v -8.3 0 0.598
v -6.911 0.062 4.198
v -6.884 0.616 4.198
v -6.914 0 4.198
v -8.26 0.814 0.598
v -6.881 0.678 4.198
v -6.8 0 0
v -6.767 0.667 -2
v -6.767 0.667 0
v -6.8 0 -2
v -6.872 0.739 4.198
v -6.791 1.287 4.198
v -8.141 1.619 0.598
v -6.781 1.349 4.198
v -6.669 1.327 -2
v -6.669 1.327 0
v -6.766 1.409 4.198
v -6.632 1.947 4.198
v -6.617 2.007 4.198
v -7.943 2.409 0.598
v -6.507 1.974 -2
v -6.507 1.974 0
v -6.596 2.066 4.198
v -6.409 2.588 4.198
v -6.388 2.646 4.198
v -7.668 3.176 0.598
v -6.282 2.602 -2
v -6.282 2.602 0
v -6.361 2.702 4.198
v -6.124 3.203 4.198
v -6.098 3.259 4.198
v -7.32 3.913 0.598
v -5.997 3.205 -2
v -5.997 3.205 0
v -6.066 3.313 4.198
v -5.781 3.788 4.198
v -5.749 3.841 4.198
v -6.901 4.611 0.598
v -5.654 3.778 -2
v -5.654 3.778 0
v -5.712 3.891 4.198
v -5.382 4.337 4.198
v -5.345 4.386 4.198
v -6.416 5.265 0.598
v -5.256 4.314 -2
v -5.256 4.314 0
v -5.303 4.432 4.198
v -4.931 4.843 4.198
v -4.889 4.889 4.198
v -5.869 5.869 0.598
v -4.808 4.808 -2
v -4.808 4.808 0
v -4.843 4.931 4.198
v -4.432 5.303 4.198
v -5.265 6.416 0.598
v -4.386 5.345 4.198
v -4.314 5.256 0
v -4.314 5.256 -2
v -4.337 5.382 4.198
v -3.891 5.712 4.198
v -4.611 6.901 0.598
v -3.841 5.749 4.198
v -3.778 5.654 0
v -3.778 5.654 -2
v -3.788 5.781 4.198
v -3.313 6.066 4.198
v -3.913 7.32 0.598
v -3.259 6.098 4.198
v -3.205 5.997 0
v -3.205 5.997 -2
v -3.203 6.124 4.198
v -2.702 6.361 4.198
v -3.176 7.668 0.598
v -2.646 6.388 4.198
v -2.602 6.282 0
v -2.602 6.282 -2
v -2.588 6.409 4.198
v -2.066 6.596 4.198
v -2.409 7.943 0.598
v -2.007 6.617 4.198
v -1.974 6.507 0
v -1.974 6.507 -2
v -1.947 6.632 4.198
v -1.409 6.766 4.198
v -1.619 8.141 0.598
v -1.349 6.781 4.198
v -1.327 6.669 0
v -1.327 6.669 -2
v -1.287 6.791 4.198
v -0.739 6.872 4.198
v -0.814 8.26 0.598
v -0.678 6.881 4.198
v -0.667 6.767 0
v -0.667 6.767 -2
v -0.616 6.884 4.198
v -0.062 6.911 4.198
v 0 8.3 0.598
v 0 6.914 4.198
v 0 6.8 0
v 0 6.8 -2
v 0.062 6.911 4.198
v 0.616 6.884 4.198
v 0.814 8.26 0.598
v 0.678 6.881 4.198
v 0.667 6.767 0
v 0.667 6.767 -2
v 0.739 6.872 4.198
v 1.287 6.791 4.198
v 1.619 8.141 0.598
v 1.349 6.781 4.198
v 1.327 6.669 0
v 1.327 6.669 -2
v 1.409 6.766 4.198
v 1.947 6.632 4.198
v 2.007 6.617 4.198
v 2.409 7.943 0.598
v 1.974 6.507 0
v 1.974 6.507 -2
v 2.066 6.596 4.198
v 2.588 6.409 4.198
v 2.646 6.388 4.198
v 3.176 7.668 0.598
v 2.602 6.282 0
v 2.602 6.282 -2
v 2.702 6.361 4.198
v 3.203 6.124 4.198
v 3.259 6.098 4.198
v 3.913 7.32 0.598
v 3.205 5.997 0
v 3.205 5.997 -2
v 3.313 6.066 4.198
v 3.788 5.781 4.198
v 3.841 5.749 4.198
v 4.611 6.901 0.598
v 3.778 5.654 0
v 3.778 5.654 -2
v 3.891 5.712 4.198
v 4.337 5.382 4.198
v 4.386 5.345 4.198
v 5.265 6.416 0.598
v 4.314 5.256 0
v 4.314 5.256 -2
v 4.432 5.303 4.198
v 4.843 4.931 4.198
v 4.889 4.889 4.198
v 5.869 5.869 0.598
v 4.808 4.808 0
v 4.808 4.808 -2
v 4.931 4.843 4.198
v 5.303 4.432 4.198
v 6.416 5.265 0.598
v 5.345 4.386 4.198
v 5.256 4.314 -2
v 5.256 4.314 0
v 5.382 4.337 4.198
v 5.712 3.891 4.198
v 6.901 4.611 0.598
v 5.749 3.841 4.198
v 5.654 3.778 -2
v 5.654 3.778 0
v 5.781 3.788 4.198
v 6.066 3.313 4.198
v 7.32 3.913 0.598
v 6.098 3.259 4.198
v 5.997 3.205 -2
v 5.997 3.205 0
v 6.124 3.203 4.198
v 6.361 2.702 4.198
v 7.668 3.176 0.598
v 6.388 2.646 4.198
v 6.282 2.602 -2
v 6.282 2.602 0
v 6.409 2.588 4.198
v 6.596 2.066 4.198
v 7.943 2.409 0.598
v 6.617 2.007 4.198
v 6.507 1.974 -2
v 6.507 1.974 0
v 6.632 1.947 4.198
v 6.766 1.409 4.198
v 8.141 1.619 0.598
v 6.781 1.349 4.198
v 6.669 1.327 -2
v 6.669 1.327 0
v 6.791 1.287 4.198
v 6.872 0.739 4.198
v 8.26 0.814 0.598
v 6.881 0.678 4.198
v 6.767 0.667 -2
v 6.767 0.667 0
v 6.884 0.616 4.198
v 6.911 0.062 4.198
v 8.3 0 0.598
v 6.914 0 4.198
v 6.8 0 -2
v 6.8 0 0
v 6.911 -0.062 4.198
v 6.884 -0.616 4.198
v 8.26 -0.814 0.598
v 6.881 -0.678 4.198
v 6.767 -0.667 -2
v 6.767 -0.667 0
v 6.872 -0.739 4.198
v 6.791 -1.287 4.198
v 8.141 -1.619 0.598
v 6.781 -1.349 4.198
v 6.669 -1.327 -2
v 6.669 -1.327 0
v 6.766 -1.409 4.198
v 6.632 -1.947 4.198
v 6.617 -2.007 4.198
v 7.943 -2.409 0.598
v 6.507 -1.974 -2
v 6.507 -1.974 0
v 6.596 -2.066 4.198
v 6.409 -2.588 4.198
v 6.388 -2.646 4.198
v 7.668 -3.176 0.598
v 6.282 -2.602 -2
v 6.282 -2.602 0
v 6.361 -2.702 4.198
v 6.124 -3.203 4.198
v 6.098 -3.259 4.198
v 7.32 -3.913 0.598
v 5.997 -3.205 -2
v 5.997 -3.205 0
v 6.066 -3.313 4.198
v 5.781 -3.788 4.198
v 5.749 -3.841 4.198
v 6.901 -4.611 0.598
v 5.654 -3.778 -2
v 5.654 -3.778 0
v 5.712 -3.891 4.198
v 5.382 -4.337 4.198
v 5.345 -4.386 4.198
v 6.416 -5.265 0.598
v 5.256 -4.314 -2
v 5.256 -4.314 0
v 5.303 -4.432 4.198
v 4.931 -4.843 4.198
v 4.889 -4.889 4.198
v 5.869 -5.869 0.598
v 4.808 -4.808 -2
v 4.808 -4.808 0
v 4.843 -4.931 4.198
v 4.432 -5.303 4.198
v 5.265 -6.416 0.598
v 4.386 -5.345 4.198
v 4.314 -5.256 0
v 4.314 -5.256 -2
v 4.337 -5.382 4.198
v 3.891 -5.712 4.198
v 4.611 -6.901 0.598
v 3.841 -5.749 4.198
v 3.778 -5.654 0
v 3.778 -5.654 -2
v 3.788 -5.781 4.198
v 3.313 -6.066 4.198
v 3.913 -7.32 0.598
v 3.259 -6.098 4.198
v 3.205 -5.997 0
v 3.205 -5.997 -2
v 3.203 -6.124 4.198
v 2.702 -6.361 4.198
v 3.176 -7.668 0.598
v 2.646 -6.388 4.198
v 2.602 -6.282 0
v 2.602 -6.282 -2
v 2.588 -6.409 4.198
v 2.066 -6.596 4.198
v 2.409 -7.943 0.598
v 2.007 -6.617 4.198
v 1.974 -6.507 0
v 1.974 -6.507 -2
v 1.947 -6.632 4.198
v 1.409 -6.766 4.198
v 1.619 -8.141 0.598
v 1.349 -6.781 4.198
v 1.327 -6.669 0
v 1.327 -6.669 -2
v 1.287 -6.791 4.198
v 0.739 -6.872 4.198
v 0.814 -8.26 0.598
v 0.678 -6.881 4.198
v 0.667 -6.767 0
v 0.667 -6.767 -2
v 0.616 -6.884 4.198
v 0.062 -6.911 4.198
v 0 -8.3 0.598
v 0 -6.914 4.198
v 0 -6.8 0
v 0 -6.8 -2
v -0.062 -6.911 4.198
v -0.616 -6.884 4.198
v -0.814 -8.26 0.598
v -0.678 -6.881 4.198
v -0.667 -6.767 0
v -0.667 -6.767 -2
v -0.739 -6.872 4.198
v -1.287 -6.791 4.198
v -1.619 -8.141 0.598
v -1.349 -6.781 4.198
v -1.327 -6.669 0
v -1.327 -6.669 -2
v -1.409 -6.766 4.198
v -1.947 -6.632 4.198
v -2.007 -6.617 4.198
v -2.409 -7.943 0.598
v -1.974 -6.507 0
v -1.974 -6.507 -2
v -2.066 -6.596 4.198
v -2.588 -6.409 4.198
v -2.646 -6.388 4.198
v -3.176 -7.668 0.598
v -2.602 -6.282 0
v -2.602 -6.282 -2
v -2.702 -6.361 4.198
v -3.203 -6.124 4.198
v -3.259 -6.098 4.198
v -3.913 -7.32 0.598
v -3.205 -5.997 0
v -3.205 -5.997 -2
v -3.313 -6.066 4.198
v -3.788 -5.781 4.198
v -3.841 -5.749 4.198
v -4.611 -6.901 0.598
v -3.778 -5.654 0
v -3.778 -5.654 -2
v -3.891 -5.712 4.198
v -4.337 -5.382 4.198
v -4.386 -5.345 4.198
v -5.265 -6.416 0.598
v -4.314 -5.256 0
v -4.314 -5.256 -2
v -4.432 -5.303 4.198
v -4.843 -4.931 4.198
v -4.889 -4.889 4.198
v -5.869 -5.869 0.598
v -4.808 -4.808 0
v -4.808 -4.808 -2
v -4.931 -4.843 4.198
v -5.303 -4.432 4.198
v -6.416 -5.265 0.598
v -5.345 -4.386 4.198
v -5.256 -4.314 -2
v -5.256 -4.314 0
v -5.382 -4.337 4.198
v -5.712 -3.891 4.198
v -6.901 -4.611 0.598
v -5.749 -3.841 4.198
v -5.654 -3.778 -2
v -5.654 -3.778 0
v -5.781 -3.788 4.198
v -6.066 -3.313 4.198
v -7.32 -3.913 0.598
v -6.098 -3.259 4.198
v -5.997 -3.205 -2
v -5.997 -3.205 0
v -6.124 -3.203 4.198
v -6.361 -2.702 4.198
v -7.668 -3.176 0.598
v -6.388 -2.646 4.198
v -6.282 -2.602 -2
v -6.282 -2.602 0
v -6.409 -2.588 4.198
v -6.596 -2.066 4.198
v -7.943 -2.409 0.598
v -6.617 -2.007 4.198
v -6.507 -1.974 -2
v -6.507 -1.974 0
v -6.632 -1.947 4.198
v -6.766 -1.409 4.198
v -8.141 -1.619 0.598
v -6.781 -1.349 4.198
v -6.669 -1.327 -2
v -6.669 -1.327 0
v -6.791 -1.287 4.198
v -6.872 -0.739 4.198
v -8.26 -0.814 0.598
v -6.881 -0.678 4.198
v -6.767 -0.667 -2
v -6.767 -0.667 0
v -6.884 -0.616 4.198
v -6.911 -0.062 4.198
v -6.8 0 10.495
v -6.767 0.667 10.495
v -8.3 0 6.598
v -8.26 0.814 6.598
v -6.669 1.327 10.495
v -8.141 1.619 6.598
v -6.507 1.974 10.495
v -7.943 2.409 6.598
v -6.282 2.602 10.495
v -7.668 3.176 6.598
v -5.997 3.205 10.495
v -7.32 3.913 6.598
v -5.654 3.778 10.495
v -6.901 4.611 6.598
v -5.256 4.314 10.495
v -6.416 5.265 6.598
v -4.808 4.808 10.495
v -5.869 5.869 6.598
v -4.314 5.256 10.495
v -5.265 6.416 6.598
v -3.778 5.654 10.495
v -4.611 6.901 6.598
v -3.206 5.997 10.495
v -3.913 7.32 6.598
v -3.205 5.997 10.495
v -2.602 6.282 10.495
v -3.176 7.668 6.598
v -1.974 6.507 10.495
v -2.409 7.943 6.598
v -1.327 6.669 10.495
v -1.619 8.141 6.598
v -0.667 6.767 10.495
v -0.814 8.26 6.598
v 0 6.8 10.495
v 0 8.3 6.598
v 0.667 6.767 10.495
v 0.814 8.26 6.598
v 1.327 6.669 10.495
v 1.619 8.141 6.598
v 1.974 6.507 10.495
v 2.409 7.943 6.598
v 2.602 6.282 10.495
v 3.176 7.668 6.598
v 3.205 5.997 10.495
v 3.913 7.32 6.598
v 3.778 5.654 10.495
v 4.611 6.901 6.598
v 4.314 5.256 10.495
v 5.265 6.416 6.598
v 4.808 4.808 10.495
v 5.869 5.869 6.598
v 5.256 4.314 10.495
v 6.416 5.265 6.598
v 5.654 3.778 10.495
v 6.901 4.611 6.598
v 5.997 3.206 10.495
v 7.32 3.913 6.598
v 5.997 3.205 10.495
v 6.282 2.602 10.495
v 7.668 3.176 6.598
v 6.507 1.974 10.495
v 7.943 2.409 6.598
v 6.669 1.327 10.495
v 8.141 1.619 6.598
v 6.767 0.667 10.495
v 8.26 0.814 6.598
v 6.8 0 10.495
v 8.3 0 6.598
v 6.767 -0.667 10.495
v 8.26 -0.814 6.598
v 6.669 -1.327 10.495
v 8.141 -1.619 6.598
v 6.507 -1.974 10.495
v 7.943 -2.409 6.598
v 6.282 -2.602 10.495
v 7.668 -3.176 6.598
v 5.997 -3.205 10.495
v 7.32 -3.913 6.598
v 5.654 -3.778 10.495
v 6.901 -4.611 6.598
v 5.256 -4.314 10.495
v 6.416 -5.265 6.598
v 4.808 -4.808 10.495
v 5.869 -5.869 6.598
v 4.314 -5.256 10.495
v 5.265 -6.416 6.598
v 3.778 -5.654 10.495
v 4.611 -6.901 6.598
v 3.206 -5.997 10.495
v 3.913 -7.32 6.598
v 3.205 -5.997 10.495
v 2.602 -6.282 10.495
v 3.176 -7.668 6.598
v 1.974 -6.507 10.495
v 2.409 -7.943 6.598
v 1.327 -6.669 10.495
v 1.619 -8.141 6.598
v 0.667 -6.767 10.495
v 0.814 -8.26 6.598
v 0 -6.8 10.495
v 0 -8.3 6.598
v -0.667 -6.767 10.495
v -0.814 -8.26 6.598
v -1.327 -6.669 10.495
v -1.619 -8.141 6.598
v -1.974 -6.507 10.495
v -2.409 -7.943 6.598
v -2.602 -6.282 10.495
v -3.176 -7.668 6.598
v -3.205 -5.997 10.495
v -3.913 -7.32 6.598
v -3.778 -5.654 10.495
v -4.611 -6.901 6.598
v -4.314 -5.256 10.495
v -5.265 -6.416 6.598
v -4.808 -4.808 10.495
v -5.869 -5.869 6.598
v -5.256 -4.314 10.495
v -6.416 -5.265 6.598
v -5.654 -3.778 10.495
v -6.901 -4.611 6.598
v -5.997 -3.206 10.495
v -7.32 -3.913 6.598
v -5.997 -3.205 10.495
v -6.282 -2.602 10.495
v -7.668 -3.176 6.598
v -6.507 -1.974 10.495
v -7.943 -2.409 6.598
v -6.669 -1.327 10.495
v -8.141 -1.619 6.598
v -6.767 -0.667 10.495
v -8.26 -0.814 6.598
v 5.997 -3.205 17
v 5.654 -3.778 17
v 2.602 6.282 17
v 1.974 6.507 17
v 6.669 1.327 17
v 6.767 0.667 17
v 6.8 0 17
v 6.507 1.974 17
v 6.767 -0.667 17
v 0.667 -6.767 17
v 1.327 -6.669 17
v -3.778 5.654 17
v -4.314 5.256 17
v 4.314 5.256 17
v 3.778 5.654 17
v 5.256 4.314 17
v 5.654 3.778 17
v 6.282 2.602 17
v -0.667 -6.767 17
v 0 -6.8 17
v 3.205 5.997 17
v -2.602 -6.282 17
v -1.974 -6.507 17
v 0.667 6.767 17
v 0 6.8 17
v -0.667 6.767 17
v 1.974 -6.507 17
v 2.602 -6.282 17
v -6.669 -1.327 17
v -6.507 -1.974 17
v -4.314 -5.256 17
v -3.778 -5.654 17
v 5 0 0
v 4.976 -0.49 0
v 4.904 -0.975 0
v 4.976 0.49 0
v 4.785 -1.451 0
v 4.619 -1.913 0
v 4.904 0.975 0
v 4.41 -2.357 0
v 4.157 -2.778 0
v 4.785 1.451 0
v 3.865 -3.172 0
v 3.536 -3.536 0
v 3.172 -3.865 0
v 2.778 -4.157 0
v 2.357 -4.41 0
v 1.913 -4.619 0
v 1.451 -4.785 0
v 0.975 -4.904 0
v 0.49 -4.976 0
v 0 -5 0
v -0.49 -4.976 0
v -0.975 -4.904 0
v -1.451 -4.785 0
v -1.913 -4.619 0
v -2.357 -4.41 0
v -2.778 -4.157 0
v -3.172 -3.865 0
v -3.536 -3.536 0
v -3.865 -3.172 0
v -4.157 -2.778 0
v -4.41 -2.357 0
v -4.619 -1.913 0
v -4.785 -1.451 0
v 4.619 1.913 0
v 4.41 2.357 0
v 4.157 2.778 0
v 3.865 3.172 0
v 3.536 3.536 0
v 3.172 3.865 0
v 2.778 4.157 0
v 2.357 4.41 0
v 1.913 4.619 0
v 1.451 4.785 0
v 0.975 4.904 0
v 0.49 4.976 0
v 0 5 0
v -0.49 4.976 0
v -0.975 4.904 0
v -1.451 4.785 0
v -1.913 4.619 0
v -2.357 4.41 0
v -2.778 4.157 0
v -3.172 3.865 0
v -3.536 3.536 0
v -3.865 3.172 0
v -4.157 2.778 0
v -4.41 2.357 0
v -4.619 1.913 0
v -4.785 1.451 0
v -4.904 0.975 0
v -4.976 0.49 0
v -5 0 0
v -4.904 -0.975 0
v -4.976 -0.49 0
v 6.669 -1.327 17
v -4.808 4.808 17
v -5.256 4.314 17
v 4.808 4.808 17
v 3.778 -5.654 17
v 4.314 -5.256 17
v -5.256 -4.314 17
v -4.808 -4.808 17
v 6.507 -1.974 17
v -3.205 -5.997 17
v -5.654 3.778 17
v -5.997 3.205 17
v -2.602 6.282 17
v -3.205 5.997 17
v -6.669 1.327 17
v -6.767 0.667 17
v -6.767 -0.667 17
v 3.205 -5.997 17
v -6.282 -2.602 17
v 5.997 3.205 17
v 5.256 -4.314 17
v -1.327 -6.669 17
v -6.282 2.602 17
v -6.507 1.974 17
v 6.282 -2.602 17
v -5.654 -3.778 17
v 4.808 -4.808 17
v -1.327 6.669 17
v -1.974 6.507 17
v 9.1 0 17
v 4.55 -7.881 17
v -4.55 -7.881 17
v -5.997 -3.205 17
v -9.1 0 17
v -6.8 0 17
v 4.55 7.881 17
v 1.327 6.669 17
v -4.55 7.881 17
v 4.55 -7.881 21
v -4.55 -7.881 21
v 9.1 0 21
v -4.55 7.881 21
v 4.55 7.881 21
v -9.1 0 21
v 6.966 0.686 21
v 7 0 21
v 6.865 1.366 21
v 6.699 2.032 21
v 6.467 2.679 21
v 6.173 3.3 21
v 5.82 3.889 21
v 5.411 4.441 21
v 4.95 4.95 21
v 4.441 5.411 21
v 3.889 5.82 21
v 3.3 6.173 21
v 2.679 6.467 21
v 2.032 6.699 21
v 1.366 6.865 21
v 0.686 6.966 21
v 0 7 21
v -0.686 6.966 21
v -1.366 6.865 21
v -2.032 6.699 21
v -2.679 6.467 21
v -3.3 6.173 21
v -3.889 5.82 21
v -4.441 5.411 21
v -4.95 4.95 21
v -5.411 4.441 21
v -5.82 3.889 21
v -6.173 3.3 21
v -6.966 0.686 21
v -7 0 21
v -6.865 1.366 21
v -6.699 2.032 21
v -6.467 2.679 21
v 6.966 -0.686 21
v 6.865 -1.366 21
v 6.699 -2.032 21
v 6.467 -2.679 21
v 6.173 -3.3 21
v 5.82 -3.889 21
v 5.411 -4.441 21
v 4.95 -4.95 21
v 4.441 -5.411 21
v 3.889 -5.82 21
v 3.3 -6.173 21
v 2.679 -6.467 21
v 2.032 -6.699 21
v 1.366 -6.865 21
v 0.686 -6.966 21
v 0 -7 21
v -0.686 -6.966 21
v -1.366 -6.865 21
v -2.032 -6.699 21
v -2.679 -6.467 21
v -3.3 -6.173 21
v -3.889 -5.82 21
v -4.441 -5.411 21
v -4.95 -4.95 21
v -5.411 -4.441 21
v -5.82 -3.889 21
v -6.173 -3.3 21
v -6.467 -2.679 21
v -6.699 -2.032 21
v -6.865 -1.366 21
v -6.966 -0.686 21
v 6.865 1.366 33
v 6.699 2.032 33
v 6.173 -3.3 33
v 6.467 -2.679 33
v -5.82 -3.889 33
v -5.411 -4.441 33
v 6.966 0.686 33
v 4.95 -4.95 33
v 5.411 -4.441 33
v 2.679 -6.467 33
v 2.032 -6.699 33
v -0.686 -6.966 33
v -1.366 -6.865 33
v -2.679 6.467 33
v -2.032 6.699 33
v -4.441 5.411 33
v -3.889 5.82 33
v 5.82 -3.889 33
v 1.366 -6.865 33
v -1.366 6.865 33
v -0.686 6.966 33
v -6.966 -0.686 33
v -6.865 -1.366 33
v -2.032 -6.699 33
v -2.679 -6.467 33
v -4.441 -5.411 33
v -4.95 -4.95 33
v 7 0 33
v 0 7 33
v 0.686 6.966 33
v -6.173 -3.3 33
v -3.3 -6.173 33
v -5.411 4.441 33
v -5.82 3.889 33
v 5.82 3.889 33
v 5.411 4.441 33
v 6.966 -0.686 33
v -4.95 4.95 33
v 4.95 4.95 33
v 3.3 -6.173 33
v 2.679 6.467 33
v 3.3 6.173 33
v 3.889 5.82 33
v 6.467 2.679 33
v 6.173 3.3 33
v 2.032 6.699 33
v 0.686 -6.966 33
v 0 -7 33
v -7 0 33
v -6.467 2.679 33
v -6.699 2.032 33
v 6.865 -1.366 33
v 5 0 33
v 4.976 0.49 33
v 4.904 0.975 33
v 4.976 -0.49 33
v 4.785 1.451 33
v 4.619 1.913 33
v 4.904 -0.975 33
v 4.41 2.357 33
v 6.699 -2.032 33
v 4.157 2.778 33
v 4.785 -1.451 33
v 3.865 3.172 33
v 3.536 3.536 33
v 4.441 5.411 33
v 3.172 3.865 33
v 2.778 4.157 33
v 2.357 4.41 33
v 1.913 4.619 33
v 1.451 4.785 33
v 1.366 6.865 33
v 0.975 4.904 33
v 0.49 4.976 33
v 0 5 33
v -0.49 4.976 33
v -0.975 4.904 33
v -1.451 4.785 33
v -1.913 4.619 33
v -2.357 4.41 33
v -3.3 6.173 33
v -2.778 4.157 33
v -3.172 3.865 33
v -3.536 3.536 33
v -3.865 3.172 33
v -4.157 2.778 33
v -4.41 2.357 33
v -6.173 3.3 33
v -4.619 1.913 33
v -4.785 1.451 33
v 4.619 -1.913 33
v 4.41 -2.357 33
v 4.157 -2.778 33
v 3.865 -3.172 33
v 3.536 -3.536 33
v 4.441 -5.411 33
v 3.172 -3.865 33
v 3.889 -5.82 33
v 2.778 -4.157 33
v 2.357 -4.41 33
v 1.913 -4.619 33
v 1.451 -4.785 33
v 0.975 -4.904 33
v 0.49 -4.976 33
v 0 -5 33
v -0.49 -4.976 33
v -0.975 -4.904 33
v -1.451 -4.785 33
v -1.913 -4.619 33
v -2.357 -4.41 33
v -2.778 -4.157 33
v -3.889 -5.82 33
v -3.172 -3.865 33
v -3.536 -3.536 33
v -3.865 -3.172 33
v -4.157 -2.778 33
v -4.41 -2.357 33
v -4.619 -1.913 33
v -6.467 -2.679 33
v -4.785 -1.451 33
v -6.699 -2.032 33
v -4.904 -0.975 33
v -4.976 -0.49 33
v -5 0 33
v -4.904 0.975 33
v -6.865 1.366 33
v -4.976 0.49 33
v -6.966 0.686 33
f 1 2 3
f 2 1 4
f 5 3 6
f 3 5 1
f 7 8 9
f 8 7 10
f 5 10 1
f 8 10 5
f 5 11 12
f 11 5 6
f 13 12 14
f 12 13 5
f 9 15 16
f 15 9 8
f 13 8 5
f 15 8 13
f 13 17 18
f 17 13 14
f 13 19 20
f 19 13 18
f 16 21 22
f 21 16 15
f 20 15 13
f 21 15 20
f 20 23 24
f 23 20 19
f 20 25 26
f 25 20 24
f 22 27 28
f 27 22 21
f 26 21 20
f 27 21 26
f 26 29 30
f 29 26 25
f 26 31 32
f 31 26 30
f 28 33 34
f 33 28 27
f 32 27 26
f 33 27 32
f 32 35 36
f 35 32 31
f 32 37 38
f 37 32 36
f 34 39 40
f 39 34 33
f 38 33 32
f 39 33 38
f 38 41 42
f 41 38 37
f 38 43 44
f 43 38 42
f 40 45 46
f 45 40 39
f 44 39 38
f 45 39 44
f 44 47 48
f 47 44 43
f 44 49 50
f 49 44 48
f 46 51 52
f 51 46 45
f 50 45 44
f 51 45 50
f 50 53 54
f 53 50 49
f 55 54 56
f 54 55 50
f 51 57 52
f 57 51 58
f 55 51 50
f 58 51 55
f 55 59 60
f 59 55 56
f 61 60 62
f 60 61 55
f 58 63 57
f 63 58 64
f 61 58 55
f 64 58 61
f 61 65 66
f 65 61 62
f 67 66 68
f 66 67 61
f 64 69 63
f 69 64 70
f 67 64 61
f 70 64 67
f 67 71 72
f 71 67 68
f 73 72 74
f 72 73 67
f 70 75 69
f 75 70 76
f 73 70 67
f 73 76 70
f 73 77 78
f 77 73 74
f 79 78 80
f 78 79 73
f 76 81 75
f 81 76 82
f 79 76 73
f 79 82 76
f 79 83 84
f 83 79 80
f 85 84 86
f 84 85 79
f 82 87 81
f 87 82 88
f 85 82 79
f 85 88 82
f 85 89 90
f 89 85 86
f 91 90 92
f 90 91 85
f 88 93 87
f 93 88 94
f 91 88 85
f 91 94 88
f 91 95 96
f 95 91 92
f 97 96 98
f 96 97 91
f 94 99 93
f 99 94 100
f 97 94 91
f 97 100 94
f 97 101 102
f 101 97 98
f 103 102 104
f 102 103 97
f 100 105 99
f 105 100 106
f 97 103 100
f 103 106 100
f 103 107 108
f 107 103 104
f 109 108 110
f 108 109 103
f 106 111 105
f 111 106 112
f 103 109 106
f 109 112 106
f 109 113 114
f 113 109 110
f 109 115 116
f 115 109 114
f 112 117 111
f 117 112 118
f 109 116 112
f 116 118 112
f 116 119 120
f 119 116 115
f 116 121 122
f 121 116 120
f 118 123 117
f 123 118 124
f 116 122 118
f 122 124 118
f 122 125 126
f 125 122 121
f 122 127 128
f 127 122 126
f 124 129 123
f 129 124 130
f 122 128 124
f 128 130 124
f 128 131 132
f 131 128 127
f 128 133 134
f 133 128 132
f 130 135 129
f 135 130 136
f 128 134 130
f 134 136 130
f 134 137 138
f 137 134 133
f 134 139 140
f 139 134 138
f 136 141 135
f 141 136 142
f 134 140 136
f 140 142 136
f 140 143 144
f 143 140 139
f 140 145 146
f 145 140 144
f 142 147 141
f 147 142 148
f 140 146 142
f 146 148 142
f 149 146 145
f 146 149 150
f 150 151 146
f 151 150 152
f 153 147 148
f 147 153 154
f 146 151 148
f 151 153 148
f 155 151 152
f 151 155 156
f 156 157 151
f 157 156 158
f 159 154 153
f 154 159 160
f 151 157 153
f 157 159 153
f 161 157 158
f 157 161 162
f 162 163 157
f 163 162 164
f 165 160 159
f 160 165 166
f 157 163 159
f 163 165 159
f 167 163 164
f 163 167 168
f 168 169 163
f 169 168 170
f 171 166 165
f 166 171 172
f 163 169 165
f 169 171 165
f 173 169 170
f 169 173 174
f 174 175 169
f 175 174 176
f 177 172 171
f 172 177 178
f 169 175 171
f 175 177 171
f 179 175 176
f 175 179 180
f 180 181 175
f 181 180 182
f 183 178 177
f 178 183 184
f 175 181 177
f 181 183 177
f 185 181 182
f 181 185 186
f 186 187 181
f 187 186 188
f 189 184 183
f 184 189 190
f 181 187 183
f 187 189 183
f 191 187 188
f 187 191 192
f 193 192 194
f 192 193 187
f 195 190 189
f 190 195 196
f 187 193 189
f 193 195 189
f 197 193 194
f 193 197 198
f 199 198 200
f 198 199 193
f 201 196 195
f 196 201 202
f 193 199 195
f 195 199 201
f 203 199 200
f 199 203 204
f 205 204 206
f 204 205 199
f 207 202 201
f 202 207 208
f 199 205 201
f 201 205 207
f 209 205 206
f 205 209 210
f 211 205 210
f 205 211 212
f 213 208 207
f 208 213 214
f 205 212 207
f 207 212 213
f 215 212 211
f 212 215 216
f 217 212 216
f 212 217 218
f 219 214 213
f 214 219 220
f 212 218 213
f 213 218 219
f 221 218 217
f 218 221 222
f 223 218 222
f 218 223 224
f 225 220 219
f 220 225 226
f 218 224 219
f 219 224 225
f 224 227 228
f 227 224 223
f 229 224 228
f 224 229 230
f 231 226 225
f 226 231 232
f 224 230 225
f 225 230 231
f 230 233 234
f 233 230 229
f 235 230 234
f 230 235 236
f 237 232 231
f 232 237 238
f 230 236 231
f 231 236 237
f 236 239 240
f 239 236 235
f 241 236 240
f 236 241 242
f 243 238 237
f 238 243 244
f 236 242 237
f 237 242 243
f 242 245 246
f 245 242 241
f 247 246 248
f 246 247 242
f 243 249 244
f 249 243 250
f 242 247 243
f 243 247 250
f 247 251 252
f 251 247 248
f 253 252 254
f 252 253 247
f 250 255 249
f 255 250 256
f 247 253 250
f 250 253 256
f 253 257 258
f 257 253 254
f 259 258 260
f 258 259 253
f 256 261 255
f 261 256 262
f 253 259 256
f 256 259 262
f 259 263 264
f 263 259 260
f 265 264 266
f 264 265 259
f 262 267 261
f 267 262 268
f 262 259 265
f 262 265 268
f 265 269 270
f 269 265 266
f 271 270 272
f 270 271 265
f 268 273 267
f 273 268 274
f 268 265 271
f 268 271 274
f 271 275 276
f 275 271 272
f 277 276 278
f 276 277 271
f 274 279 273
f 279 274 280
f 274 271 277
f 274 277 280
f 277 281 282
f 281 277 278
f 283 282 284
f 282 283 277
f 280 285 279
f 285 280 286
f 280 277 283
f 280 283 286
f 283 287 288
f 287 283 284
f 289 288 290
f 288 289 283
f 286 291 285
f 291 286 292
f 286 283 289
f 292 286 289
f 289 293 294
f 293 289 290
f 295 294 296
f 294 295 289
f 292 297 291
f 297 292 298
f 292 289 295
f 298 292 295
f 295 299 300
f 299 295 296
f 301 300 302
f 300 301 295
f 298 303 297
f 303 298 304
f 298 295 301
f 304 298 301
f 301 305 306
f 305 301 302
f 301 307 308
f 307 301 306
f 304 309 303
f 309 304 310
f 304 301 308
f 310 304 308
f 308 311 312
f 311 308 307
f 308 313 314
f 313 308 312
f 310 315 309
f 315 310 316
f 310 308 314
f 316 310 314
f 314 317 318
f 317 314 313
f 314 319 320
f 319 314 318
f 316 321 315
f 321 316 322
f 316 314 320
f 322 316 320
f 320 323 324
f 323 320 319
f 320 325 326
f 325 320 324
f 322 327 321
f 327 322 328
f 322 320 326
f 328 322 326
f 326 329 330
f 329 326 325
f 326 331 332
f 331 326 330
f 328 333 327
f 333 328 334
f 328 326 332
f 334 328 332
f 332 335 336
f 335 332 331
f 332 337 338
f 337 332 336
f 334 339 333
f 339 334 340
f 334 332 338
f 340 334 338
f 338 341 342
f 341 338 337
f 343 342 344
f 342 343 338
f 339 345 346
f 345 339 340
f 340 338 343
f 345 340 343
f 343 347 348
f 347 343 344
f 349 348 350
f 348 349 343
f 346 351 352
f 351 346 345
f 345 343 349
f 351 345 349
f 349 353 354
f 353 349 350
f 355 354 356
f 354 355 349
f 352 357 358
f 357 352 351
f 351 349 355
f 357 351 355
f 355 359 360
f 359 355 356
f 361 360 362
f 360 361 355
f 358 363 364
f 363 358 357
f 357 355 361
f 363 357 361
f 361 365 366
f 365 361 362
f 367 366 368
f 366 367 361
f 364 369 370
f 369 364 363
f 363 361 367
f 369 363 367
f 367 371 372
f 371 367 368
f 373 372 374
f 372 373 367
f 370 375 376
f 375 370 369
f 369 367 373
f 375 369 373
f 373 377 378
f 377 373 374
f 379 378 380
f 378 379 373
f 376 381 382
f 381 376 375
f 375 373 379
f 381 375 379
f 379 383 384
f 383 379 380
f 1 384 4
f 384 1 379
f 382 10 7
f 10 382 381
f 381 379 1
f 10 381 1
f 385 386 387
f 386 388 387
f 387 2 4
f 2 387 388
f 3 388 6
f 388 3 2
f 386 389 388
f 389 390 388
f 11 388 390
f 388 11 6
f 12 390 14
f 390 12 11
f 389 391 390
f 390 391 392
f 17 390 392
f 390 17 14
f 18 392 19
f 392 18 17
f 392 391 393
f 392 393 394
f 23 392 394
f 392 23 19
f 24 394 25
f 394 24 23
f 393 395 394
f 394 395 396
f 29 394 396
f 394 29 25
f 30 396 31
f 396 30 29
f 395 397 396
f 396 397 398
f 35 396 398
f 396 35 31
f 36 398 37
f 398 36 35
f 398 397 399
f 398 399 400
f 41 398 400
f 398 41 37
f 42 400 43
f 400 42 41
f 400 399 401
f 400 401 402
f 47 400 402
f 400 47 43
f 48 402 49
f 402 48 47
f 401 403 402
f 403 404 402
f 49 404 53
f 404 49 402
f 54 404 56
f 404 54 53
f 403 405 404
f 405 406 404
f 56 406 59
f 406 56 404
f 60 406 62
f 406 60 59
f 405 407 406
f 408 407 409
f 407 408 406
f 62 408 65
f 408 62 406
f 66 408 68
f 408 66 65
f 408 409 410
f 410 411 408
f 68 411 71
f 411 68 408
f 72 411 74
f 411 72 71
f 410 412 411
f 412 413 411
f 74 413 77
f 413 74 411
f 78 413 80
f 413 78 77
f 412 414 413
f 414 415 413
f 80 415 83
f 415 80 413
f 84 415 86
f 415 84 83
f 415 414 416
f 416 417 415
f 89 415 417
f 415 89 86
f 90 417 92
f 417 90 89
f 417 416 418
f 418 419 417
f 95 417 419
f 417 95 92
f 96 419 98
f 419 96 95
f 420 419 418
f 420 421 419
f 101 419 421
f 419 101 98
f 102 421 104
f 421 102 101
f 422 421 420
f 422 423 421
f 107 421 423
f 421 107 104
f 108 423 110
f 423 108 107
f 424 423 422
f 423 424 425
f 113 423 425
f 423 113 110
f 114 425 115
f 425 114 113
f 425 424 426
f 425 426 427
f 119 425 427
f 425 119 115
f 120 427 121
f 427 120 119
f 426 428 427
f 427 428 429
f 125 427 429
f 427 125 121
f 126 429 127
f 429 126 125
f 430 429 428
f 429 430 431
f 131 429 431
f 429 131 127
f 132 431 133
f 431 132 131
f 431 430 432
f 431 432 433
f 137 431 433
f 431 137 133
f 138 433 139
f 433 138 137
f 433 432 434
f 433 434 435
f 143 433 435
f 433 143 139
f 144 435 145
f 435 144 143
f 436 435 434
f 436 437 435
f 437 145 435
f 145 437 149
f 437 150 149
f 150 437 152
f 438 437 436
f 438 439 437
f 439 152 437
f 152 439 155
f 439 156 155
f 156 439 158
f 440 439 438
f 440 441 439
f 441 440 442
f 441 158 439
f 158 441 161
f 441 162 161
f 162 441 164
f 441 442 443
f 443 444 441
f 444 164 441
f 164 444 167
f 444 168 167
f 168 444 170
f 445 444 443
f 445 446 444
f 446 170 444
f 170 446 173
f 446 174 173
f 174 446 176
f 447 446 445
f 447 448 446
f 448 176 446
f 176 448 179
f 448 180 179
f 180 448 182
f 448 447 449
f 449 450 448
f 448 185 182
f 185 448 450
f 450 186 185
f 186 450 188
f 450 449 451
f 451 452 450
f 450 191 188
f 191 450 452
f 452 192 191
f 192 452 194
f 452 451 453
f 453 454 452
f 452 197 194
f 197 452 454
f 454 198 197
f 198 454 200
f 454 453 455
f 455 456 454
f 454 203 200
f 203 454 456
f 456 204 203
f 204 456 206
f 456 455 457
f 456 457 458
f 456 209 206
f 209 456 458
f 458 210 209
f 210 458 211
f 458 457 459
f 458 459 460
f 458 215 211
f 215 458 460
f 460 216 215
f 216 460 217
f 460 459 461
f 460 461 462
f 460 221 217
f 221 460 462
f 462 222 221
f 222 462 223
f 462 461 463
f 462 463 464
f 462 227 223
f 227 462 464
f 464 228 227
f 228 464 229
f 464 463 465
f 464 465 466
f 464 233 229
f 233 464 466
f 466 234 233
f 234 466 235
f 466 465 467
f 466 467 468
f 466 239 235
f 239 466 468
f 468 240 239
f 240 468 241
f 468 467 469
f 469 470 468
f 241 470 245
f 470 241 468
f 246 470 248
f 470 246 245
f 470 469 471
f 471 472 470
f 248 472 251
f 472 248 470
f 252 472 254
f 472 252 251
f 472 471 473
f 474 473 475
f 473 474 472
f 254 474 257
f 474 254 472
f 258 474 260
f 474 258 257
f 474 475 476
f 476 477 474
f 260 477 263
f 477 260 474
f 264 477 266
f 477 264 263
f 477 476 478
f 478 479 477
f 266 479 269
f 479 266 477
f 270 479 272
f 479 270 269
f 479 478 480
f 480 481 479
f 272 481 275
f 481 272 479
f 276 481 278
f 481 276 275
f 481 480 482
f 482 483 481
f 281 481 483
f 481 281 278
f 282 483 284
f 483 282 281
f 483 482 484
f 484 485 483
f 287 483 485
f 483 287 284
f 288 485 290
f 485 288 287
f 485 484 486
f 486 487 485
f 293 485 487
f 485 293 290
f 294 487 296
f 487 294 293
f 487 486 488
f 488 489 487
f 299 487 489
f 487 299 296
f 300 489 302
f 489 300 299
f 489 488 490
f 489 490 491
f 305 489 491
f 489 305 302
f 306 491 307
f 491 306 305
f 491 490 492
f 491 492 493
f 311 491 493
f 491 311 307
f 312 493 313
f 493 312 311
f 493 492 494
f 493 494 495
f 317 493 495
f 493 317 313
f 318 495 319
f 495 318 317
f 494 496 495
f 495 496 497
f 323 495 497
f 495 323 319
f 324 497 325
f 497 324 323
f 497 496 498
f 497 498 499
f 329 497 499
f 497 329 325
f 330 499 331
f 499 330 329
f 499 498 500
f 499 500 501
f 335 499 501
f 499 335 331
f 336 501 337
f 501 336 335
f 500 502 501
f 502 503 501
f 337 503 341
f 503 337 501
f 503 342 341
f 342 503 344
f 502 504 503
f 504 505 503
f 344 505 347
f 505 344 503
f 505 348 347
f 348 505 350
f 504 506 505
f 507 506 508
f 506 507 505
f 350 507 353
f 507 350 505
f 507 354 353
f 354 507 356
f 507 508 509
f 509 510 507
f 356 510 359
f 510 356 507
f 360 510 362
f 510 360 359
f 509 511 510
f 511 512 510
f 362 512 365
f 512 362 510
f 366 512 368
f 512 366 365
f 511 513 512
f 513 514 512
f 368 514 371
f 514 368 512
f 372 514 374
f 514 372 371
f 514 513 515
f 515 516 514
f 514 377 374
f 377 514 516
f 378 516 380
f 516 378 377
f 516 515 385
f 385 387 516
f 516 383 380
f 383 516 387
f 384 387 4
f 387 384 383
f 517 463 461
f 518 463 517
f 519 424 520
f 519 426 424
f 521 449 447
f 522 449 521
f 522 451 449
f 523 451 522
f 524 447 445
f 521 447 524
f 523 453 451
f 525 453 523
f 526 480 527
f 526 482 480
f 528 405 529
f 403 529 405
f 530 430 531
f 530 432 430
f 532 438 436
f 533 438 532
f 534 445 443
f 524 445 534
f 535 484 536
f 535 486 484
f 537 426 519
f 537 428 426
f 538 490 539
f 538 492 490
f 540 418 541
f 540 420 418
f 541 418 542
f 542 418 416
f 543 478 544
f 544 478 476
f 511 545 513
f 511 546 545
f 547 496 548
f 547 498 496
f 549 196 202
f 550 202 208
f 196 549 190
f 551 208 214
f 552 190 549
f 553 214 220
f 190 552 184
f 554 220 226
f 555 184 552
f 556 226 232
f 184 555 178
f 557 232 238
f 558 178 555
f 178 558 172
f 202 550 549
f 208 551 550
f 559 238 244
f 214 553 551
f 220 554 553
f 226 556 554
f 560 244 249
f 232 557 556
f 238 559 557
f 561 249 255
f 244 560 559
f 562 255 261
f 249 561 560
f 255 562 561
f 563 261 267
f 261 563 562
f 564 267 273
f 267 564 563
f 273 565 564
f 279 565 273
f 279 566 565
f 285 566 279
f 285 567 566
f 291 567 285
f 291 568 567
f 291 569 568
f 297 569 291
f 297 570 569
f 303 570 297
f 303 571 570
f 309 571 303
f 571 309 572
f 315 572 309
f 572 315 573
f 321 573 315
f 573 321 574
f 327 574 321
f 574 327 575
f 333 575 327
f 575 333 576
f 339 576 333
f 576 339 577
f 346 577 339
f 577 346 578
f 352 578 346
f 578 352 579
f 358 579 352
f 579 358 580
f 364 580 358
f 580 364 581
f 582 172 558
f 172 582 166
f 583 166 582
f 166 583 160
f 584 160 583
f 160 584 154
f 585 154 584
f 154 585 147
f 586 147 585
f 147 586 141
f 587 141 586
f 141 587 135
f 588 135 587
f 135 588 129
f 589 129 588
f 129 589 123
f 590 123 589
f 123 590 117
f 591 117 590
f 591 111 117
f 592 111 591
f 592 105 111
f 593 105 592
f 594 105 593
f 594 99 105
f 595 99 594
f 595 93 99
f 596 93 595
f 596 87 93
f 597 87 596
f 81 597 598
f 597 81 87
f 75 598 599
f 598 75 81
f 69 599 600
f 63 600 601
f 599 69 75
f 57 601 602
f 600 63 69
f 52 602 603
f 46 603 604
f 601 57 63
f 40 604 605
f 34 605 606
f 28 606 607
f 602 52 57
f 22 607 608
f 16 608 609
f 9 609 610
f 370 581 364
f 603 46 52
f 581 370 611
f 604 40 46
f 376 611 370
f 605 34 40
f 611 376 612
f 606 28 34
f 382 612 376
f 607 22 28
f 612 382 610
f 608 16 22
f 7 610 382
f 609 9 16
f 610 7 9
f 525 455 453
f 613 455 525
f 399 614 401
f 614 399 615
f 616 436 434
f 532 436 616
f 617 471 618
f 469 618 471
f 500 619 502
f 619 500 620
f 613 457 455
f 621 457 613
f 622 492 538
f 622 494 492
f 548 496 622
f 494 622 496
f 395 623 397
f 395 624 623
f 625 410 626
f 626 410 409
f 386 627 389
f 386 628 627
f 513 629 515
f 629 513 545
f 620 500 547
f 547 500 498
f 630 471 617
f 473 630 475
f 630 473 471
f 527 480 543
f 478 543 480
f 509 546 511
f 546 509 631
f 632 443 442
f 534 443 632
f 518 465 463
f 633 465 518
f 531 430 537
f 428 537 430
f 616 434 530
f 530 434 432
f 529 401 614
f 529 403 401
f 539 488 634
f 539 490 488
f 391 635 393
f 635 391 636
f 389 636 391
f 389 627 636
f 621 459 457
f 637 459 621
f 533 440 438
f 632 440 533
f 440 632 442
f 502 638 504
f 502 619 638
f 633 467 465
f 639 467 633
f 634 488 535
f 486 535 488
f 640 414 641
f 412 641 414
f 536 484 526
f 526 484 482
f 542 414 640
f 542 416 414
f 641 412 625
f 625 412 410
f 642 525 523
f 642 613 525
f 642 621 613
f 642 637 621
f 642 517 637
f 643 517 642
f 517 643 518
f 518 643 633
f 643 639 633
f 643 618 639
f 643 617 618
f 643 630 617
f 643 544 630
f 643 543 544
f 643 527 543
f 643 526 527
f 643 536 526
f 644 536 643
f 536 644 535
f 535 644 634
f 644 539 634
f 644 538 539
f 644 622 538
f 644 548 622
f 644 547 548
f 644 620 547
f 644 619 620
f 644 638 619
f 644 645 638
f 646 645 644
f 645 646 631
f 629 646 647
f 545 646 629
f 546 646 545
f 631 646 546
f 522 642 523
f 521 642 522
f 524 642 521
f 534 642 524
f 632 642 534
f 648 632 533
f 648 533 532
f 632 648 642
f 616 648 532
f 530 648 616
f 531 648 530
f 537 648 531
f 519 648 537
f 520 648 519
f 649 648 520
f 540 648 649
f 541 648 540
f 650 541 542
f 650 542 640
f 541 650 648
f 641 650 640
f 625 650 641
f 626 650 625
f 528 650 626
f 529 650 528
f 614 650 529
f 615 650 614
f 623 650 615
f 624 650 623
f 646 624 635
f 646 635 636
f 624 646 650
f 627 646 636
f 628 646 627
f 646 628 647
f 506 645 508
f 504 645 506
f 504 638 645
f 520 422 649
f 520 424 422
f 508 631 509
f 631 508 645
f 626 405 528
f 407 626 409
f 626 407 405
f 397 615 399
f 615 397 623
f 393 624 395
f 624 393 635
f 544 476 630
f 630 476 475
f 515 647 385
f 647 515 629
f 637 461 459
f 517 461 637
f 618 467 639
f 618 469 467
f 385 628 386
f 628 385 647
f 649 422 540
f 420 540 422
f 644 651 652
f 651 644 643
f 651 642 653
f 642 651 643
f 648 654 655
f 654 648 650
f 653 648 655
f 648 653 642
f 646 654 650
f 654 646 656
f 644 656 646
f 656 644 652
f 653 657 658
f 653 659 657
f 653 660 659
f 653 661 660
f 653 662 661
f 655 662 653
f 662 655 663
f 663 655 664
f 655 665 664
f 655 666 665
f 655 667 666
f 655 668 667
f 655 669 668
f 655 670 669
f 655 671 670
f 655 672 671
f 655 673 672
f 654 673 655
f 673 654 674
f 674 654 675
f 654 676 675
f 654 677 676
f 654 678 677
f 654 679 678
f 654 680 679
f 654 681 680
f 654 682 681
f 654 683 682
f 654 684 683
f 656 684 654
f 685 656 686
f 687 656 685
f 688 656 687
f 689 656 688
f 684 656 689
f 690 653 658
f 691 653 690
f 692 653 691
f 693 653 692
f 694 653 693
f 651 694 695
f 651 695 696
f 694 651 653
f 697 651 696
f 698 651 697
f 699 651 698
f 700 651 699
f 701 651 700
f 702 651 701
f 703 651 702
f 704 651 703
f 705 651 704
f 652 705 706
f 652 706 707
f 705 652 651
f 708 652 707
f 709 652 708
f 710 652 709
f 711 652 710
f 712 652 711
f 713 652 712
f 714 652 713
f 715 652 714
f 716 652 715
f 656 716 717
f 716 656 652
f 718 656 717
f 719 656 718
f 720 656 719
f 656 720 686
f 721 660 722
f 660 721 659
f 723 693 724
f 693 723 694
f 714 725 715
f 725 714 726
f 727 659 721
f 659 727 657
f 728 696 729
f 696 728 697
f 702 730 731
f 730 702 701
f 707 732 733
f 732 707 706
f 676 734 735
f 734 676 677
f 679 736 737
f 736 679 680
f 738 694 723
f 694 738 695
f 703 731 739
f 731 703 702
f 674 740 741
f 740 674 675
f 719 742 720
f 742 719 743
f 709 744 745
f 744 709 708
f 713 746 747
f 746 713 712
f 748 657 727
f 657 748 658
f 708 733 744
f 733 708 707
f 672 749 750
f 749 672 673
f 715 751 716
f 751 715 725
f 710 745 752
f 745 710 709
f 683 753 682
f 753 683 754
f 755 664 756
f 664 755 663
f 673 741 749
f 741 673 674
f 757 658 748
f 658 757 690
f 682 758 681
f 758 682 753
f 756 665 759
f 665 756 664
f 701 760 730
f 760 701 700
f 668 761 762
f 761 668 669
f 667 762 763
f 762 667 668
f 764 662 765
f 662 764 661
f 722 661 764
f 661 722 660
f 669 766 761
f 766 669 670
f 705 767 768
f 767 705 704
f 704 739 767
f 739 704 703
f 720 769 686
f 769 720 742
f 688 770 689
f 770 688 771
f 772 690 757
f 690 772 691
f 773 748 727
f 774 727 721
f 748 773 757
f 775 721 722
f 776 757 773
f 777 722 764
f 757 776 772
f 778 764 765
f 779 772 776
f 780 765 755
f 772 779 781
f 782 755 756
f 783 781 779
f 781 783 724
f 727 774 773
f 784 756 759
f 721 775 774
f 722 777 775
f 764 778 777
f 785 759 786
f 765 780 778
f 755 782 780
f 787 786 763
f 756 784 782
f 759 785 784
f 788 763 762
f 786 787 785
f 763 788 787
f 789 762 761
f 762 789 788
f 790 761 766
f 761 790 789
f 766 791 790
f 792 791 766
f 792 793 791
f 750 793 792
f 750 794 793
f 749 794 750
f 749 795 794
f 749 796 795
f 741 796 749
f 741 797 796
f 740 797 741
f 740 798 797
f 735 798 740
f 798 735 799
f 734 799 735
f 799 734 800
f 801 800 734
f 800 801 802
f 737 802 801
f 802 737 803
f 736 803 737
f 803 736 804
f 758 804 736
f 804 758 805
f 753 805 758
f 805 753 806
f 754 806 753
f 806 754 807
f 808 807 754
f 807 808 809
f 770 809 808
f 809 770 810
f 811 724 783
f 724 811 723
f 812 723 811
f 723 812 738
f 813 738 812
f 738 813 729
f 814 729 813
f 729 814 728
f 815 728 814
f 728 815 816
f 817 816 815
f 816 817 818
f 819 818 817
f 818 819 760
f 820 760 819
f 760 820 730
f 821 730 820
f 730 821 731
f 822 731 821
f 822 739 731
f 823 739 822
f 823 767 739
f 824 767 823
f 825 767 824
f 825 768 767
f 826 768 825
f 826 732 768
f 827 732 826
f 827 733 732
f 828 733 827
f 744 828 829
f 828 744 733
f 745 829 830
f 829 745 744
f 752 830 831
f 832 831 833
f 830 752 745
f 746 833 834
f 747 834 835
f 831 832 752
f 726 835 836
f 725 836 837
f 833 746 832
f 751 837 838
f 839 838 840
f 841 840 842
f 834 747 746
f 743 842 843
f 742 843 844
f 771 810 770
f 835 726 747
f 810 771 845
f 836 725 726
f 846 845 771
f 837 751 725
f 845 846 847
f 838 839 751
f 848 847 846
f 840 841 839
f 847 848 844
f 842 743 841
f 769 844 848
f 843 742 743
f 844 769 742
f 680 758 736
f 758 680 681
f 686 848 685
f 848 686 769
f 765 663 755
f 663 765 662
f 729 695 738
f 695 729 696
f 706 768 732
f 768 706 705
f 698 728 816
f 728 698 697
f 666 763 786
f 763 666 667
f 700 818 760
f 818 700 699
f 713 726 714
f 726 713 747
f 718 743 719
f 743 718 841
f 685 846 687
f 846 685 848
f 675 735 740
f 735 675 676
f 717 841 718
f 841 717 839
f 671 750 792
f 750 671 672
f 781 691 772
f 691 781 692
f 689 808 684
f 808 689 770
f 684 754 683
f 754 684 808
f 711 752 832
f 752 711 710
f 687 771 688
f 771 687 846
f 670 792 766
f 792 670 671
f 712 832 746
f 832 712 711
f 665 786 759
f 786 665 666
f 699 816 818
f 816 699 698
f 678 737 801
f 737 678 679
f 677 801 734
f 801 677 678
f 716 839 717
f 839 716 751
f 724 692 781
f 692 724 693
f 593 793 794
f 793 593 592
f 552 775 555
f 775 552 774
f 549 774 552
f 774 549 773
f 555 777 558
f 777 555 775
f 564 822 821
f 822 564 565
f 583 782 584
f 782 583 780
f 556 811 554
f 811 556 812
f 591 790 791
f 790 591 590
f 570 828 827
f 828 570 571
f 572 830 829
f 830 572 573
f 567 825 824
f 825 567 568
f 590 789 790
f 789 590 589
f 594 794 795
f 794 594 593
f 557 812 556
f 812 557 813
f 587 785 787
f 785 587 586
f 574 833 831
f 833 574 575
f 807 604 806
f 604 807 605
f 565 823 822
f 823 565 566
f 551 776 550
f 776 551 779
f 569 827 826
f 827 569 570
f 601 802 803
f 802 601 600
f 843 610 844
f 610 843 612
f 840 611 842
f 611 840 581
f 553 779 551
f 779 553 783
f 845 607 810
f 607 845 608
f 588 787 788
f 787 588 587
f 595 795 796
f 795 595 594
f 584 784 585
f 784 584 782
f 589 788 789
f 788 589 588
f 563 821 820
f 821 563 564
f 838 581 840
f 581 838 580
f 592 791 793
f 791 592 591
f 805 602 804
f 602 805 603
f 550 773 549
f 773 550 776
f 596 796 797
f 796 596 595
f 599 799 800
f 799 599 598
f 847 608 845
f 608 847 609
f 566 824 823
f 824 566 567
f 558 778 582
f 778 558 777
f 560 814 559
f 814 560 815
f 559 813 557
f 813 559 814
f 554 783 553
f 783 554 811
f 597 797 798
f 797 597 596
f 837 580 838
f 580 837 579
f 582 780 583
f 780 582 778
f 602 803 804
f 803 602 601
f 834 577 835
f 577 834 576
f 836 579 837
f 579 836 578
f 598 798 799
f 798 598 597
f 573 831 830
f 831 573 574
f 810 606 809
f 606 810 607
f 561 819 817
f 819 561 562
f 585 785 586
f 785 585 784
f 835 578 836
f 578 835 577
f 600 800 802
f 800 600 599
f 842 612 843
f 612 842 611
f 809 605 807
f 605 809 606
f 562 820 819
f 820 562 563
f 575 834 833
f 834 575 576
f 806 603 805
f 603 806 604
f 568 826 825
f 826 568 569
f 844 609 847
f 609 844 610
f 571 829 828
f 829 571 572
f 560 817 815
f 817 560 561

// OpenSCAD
// ============================================================
// Parametric Hose Barb
// ============================================================
// All measurements are in millimeters

// --- Main Parameters ---
barb_count        = 2;      // Number of barb rings
hose_id           = 10;      // Inner diameter of the hose (mm)
wall_thickness    = 1.8;    // Wall thickness of the barb tube
barb_height       = 1.5;    // How tall/sharp each barb protrusion is
barb_spacing      = 6;      // Distance between barb rings (center to center)
barb_angle        = 30;     // Angle of the barb taper (degrees, lower = sharper)
body_length_extra = 5;      // Extra straight tube length beyond last barb

// --- Fitting End Parameters (e.g., NPT or push-fit stub) ---
fitting_od        = 14;     // Outer diameter of the fitting end
fitting_length    = 12;     // Length of the fitting end
fitting_thread    = false;  // Set to true to add a simple thread placeholder

// --- Thread Parameters (used only if fitting_thread = true) ---
thread_pitch      = 1.5;    // Thread pitch in mm
thread_depth      = 0.8;    // Depth of thread grooves

// --- General ---
$fn               = 64;     // Smoothness of circles
taper_lead_in     = 3;      // Length of tapered lead-in tip at barb end

// ============================================================
// Derived Values
// ============================================================
barb_od       = hose_id + (wall_thickness * 2);           // Outer diameter of tube
total_barb_len = (barb_count * barb_spacing) + body_length_extra;

// ============================================================
// Module: Single Barb Ring
// ============================================================
module barb_ring(tube_od, barb_h, b_angle) {
    barb_tip_r  = (tube_od / 2) + barb_h;
    barb_base_r = tube_od / 2;
    barb_width  = barb_h / tan(b_angle);

    rotate_extrude(angle = 360) {
        polygon(points = [
            [barb_base_r, 0],
            [barb_tip_r,  barb_width],
            [barb_base_r, barb_width * 2.5],
            [barb_base_r, 0]
        ]);
    }
}

// ============================================================
// Module: Barb Tube Section
// ============================================================
module barb_tube() {
    union() {
        // Main tube body
        cylinder(h = total_barb_len, d = barb_od);

        // Barb rings
        translate([0,0,-5])
        for (i = [0 : barb_count - 1]) {
            translate([0, 0, taper_lead_in + (i * barb_spacing)])
                barb_ring(barb_od, barb_height, barb_angle);
        }

        // Tapered lead-in tip
        cylinder(h = taper_lead_in, d1 = barb_od * 0.6, d2 = barb_od);
    }
}

// ============================================================
// Module: Fitting End
// ============================================================
module fitting_end() {
    difference() {
        cylinder(h = fitting_length, d = fitting_od);

        // Thread grooves (simple visual representation)
        if (fitting_thread) {
            for (i = [0 : floor(fitting_length / thread_pitch)]) {
                translate([0, 0, i * thread_pitch])
                    rotate_extrude(angle = 360)
                        translate([(fitting_od / 2) - thread_depth, 0, 0])
                            circle(r = thread_depth * 0.7);
            }
        }
    }
}

// ============================================================
// Module: Hex Collar / Flange (optional grip feature)
// ============================================================
hex_collar       = true;    // Set to false to disable
hex_collar_size  = fitting_od * 1.3;  // Across-flats size
hex_collar_h     = 4;

module hex_collar() {
    if (hex_collar) {
        cylinder(h = hex_collar_h, d = hex_collar_size, $fn = 6);
    }
}

// ============================================================
// Final Assembly
// ============================================================
module hose_barb() {
    difference() {
        union() {
            // Barb end (tip points down at Z=0)
            barb_tube();

            // Hex collar sits on top of barb tube
            translate([0, 0, total_barb_len])
                hex_collar();

            // Fitting end on top of collar
            translate([0, 0, total_barb_len + (hex_collar ? hex_collar_h : 0)])
                fitting_end();
        }

        // Hollow through-bore
        total_height = total_barb_len + (hex_collar ? hex_collar_h : 0) + fitting_length;
        translate([0, 0, -0.1])
            cylinder(
                h = total_height + 0.2,
                d = hose_id
            );
    }
}

// ============================================================
// Render
// ============================================================
hose_barb();
